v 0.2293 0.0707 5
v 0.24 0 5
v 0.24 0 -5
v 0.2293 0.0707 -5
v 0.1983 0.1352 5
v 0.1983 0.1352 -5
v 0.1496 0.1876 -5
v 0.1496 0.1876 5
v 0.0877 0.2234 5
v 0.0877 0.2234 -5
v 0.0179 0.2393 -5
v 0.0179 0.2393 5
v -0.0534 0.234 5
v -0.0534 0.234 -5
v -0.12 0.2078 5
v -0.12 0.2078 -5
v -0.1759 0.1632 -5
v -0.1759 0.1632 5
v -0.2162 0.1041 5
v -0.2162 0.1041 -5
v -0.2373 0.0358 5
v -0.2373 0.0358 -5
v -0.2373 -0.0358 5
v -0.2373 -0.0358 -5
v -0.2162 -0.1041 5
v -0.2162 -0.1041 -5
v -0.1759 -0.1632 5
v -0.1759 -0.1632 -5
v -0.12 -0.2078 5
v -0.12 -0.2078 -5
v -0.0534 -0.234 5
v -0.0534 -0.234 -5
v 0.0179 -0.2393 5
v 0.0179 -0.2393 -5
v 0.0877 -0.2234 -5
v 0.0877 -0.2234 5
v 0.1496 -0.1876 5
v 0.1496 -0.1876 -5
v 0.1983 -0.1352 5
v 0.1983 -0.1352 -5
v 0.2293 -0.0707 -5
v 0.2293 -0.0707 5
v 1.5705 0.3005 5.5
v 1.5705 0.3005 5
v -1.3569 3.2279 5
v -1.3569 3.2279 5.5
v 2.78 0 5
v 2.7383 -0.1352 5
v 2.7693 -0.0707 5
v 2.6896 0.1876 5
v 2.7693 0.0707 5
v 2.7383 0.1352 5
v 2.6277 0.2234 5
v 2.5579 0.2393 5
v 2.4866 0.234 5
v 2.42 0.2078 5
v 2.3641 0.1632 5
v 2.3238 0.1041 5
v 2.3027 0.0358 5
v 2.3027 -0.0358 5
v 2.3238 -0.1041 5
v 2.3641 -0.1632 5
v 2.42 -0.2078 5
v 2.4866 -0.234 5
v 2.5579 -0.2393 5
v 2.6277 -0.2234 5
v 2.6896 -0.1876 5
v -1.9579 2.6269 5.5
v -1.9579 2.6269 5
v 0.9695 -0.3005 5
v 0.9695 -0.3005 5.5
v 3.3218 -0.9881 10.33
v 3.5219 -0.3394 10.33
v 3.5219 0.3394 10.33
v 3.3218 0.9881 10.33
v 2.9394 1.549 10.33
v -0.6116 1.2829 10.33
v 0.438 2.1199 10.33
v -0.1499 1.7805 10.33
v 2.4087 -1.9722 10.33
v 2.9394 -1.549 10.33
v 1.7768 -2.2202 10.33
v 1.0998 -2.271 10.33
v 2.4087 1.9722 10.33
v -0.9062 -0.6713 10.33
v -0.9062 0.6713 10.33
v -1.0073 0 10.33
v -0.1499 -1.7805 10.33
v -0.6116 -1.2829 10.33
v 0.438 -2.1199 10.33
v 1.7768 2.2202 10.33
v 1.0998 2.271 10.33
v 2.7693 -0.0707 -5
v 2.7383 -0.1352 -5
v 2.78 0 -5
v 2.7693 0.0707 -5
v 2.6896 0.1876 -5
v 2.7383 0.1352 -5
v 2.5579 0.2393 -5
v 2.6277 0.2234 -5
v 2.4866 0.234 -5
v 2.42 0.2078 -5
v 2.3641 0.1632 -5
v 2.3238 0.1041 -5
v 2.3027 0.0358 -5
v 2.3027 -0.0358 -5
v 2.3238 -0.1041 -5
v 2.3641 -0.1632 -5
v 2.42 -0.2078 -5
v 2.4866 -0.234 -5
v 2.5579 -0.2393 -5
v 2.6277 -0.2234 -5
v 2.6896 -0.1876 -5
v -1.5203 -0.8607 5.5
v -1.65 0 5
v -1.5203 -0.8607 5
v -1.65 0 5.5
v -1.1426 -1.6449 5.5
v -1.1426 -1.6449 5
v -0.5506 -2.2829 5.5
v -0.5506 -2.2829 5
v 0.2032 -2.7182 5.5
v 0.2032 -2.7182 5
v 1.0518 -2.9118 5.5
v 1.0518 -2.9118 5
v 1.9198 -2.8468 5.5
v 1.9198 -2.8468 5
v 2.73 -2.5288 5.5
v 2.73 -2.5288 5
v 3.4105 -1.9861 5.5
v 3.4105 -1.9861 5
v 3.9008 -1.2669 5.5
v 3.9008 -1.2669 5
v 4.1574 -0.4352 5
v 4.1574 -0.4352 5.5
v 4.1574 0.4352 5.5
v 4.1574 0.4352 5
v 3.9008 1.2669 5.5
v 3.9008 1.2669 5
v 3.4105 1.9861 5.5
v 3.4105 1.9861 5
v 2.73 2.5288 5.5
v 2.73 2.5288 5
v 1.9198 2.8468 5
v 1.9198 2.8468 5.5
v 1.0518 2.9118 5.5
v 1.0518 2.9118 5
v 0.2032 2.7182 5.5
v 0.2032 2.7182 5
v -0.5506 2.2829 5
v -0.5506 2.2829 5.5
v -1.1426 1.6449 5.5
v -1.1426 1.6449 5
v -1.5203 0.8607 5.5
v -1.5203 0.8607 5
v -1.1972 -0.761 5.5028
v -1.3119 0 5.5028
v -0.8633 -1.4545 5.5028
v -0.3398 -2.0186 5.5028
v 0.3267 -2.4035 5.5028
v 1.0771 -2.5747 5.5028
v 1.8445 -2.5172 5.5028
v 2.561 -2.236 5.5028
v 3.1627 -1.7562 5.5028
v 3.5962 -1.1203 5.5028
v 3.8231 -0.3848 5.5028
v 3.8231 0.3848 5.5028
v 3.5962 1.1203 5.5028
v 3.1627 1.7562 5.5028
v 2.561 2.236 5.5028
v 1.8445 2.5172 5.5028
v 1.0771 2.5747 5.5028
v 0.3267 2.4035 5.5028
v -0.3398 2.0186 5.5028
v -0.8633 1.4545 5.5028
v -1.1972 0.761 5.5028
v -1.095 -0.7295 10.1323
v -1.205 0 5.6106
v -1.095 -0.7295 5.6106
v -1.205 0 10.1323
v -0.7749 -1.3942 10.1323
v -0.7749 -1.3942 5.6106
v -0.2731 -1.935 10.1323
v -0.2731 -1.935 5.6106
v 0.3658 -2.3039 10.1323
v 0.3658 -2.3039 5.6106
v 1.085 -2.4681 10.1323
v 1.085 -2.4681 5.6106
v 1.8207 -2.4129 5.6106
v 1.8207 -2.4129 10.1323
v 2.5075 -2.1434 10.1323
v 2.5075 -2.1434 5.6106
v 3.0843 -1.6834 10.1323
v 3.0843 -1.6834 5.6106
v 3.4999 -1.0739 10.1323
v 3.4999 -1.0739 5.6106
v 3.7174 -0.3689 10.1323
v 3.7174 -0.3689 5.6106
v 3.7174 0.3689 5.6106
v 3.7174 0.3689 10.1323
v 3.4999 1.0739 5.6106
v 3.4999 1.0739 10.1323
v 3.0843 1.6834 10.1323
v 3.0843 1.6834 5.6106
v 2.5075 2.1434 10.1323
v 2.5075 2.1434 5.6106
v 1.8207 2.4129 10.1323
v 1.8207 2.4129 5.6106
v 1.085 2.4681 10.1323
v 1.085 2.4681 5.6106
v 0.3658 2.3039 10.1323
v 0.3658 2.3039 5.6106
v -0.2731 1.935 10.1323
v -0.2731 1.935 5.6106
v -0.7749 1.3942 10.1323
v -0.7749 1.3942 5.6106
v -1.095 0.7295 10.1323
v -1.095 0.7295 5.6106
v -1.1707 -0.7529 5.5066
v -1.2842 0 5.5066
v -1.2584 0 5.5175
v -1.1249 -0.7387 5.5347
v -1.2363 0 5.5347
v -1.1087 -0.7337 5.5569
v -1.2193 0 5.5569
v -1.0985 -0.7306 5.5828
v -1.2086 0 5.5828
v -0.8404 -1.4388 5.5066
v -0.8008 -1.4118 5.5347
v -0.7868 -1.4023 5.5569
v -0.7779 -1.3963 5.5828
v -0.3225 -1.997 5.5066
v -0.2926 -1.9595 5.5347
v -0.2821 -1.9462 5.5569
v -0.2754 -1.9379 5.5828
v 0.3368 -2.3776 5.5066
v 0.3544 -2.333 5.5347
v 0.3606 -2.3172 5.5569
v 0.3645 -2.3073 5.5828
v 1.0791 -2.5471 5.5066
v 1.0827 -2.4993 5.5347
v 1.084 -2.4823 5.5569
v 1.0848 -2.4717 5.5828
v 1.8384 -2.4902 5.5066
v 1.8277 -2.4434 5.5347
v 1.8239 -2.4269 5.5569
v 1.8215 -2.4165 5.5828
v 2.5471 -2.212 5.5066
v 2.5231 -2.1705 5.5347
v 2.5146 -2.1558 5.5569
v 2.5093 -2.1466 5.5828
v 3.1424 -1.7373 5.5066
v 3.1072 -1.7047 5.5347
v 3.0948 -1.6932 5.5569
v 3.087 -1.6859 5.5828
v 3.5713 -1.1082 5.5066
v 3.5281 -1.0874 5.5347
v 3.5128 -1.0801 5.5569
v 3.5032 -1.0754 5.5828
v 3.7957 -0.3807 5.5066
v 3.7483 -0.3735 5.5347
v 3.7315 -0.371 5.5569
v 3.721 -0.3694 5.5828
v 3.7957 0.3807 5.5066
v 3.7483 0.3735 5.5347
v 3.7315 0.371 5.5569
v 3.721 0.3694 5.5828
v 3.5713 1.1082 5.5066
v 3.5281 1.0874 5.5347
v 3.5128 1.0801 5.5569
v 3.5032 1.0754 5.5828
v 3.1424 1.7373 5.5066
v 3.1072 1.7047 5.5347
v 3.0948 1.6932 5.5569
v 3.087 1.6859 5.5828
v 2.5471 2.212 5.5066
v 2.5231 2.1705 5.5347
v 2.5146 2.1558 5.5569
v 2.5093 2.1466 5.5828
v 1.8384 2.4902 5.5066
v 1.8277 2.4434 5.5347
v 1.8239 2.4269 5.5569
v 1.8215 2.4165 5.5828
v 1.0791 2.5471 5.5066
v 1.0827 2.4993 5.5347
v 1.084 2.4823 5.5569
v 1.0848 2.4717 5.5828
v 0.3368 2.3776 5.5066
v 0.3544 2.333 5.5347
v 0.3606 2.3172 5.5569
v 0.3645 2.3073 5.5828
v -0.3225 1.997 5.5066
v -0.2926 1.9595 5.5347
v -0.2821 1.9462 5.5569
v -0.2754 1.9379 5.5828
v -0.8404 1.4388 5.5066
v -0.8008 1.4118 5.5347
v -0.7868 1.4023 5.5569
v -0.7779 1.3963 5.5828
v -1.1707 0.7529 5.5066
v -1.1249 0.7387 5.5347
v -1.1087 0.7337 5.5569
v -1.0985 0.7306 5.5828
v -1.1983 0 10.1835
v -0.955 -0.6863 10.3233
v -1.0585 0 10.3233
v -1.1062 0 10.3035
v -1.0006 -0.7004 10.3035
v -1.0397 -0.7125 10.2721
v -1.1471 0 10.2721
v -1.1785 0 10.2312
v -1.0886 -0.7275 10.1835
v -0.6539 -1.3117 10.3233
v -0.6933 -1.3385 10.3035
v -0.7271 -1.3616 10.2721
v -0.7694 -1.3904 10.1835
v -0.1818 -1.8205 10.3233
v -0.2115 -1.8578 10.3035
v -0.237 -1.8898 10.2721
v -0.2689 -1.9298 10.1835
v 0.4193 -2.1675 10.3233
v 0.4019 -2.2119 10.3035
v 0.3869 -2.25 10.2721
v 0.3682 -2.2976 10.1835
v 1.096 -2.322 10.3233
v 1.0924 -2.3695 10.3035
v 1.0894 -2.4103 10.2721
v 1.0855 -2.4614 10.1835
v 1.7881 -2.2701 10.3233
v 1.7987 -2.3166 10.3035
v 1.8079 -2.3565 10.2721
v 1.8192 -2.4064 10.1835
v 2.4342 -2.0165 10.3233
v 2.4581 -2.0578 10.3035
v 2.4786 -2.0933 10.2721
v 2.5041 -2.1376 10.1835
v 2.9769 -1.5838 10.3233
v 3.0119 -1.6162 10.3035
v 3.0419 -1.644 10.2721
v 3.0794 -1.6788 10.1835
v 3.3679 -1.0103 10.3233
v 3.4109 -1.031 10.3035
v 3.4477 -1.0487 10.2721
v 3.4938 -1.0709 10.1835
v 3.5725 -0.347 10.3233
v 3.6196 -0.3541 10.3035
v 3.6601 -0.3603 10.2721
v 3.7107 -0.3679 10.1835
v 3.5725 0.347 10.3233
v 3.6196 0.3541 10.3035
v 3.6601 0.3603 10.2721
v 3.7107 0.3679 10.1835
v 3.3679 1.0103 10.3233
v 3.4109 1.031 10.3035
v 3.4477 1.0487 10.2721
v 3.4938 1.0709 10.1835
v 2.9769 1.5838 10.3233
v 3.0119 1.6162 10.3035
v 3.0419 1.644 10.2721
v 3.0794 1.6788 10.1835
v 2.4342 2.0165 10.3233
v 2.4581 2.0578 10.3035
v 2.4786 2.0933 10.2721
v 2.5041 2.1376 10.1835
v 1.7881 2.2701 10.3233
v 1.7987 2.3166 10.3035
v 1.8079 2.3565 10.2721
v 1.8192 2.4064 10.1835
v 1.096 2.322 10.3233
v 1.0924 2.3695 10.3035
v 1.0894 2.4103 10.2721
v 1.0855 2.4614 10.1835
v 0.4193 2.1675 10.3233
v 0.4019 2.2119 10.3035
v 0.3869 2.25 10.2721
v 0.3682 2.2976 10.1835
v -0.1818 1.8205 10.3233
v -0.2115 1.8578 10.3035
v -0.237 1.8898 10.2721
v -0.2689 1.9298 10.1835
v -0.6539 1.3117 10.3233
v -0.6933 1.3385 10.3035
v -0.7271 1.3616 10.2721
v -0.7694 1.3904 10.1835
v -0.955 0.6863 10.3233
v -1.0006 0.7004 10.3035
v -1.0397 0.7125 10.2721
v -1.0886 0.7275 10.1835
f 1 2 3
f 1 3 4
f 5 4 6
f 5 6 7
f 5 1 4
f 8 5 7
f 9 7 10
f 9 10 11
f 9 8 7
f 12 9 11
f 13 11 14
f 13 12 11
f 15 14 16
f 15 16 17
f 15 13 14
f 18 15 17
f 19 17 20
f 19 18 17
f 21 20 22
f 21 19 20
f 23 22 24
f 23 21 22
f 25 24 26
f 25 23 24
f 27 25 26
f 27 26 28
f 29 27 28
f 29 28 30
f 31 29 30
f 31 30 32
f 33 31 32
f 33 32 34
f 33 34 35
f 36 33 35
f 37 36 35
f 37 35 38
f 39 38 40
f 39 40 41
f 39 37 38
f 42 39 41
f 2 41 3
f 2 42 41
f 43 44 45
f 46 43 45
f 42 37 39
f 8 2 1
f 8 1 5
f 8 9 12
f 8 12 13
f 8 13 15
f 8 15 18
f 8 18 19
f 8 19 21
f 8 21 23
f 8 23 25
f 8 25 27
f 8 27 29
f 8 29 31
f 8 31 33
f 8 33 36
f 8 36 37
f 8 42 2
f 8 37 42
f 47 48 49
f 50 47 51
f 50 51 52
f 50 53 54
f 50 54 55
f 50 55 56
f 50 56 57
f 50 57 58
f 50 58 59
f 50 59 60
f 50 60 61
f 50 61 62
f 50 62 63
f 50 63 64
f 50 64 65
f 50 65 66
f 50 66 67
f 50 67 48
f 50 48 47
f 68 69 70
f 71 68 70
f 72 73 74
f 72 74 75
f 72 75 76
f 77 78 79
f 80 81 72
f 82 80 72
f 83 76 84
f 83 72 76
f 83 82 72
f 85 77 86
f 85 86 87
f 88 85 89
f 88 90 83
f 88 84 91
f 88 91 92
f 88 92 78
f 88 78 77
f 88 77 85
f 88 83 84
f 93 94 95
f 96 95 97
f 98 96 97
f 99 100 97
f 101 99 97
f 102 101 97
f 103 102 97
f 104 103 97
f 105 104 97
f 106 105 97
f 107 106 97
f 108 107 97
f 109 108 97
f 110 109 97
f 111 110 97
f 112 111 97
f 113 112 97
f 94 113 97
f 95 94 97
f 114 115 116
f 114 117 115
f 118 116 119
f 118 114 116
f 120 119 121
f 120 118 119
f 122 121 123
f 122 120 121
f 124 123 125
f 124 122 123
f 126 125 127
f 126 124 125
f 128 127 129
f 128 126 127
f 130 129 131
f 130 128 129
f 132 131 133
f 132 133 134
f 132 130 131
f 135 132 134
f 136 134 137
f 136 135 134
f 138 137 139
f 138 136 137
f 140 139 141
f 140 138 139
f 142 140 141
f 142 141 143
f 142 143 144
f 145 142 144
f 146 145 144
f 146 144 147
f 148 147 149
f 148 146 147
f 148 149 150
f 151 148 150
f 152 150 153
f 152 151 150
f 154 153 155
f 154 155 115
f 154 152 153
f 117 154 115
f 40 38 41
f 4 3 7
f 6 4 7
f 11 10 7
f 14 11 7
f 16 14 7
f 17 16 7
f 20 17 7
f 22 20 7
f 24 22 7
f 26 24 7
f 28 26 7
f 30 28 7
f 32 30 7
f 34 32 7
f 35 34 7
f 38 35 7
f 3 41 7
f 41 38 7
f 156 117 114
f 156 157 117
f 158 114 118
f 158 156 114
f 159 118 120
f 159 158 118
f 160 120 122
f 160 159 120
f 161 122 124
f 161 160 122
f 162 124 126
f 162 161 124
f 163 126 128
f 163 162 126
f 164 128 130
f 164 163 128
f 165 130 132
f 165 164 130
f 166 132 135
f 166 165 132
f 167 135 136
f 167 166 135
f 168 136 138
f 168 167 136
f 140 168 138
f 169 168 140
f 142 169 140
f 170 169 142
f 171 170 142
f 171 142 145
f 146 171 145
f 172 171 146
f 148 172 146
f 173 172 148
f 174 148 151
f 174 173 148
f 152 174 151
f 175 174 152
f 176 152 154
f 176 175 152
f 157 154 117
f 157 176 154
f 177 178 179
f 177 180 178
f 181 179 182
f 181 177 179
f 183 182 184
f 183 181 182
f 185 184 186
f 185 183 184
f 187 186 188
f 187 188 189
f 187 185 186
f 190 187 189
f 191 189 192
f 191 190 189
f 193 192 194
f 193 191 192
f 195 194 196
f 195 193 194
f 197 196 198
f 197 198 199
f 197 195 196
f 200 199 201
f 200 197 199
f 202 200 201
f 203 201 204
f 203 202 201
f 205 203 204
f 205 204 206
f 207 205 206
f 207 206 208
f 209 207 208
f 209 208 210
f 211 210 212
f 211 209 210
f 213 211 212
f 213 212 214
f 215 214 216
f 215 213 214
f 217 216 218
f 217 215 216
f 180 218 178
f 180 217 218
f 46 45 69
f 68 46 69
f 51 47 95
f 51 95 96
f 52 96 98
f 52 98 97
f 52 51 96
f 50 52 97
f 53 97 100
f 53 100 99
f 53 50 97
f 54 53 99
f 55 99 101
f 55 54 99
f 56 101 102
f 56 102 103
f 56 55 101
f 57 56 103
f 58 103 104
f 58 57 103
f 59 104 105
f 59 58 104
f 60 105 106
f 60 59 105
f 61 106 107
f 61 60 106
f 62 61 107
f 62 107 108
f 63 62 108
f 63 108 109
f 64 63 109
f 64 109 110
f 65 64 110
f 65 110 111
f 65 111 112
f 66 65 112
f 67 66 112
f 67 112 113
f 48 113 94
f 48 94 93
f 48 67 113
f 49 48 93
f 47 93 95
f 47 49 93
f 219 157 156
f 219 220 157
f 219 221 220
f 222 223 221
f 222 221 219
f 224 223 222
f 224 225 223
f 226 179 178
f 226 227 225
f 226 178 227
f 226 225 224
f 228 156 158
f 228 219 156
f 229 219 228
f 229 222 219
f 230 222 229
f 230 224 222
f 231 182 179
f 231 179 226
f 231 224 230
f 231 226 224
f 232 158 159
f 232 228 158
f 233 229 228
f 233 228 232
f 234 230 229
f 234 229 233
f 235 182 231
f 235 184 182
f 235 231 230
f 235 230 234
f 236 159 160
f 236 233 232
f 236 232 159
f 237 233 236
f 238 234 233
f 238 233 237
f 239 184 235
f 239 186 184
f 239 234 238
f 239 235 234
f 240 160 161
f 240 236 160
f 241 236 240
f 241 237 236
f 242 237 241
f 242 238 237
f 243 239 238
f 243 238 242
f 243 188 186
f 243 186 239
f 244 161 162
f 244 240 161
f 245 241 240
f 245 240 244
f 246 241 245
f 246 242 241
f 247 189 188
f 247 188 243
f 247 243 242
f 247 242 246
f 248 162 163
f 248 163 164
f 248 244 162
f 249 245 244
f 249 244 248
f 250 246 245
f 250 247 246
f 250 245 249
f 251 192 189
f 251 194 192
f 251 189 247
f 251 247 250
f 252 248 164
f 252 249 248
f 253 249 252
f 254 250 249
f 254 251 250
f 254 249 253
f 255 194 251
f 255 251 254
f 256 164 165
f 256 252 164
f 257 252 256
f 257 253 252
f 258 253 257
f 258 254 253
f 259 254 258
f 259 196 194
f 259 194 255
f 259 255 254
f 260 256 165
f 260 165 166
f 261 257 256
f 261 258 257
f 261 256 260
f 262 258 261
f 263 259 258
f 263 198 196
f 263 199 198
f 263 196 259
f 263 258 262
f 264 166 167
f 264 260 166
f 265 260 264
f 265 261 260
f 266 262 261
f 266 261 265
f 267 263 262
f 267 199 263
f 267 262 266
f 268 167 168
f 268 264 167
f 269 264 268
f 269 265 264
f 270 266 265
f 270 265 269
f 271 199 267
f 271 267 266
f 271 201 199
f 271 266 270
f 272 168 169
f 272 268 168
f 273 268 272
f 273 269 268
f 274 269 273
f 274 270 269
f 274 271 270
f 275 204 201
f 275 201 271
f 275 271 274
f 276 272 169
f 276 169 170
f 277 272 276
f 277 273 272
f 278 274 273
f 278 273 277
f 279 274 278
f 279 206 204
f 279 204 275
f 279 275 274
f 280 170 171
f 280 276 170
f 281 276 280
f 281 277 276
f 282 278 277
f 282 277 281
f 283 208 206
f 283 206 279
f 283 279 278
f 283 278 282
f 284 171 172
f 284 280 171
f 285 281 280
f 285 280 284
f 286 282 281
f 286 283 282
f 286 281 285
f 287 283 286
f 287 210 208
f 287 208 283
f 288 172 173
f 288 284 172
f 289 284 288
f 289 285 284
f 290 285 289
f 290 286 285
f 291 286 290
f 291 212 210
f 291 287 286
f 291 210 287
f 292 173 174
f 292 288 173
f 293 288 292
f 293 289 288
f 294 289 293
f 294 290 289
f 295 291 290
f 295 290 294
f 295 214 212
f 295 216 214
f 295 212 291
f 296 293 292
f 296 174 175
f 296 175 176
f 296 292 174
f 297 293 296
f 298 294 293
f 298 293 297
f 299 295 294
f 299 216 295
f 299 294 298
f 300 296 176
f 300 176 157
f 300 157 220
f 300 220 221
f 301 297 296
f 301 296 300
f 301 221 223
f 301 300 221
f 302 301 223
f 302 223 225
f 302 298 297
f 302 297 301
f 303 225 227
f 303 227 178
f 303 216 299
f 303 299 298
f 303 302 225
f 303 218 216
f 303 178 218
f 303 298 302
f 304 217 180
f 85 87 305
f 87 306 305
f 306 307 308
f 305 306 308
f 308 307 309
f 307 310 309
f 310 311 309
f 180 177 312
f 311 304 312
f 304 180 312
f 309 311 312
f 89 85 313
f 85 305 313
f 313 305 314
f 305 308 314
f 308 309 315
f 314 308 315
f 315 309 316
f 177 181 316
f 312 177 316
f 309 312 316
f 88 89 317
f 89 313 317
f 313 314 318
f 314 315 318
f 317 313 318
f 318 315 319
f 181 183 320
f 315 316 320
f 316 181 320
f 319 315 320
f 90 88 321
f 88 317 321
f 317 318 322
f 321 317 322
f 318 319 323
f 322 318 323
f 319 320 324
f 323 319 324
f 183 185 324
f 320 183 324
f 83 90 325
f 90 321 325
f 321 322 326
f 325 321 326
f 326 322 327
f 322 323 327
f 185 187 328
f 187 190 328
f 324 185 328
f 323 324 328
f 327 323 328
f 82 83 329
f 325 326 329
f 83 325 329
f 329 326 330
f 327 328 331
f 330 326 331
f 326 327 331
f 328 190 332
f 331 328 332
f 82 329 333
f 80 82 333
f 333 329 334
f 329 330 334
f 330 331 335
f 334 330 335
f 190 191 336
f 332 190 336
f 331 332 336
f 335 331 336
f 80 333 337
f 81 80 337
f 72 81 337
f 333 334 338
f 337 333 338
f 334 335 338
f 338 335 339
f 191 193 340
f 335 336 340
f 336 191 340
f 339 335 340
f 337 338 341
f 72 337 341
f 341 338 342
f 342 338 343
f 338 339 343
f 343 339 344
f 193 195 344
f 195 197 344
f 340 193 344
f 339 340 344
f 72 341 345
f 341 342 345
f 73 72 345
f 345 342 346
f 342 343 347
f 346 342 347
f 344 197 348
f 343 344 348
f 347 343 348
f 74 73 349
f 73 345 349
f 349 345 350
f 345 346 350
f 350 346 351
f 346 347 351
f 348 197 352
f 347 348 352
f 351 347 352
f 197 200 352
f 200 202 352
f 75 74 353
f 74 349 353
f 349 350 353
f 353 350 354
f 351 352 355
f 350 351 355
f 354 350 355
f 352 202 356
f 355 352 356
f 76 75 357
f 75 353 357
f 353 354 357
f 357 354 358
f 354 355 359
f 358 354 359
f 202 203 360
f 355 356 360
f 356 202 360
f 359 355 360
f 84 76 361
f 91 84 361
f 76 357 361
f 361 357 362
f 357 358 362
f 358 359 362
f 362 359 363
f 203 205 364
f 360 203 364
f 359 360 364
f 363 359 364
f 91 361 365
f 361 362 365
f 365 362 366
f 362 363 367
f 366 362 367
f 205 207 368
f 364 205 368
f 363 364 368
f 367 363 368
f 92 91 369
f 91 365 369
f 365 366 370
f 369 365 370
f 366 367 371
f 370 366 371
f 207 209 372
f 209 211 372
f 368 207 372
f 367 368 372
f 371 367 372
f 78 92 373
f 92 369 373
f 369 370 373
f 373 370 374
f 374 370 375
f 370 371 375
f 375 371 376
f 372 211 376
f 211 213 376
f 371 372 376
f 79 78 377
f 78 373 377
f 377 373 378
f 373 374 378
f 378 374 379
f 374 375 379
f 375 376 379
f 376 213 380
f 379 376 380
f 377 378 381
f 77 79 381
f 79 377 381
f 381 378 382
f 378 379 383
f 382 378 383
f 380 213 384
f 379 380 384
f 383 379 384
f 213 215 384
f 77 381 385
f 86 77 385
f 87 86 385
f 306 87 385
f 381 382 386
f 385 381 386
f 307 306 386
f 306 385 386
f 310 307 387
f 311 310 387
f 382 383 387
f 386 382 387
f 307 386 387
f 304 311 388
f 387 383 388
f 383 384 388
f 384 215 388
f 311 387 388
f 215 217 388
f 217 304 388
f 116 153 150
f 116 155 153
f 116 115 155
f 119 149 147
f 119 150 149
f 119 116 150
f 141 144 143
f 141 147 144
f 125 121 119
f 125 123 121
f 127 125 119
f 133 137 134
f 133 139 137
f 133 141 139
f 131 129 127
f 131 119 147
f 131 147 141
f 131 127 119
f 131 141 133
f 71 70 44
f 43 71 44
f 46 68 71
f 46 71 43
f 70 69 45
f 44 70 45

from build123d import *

# Parameters (mm, degrees)
SKETCH_R     = 0.24
PAD_DEPTH    = 10
SKETCH001_R  = 0.24
PAD002_DEPTH = 10
PAD003_DEPTH = 0.5


with BuildPart() as pad:
    # Sketch → Pad (new body)
    with BuildSketch(Plane.XY.offset(5)):
        Circle(SKETCH_R)
    extrude(amount=-PAD_DEPTH)


with BuildPart() as pad002:
    # Sketch001 → Pad002 (new body)
    with BuildSketch(Plane.XY.offset(5)):
        with Locations((2.54, 0)):
            Circle(SKETCH001_R)
    extrude(amount=-PAD002_DEPTH)


with BuildPart() as revolution:
    # Sketch003 → Revolution (revolve)
    with BuildSketch(Plane.XZ):
        with BuildLine():
            Line((1.27, 5), (-1.65, 5))
            Line((-1.65, 5), (-1.65, 5.5))
            Line((-1.65, 5.5), (-1.311932, 5.502782))
            ThreePointArc((-1.311932, 5.502782), (-1.236267, 5.534672), (-1.205, 5.610597))
            Line((-1.205, 5.610597), (-1.205, 10.132333))
            ThreePointArc((-1.007333, 10.33), (-1.147105, 10.272105), (-1.205, 10.132333))
            Line((-1.007333, 10.33), (1.27, 10.33))
            Line((1.27, 10.33), (1.27, 5))
        make_face()
    revolve(axis=Axis((1.27, 0, 2.550668), (0, 0, 1)))


with BuildPart() as pad003:
    # Sketch004 → Pad003 (new body)
    with BuildSketch(Plane.XY.offset(5)):
        Polygon((1.57052, 0.30052), (-1.356902, 3.227942), (-1.957942, 2.626902), (0.96948, -0.30052), align=None)
    extrude(amount=PAD003_DEPTH)


solid = Compound([pad.part, pad002.part, revolution.part, pad003.part])
